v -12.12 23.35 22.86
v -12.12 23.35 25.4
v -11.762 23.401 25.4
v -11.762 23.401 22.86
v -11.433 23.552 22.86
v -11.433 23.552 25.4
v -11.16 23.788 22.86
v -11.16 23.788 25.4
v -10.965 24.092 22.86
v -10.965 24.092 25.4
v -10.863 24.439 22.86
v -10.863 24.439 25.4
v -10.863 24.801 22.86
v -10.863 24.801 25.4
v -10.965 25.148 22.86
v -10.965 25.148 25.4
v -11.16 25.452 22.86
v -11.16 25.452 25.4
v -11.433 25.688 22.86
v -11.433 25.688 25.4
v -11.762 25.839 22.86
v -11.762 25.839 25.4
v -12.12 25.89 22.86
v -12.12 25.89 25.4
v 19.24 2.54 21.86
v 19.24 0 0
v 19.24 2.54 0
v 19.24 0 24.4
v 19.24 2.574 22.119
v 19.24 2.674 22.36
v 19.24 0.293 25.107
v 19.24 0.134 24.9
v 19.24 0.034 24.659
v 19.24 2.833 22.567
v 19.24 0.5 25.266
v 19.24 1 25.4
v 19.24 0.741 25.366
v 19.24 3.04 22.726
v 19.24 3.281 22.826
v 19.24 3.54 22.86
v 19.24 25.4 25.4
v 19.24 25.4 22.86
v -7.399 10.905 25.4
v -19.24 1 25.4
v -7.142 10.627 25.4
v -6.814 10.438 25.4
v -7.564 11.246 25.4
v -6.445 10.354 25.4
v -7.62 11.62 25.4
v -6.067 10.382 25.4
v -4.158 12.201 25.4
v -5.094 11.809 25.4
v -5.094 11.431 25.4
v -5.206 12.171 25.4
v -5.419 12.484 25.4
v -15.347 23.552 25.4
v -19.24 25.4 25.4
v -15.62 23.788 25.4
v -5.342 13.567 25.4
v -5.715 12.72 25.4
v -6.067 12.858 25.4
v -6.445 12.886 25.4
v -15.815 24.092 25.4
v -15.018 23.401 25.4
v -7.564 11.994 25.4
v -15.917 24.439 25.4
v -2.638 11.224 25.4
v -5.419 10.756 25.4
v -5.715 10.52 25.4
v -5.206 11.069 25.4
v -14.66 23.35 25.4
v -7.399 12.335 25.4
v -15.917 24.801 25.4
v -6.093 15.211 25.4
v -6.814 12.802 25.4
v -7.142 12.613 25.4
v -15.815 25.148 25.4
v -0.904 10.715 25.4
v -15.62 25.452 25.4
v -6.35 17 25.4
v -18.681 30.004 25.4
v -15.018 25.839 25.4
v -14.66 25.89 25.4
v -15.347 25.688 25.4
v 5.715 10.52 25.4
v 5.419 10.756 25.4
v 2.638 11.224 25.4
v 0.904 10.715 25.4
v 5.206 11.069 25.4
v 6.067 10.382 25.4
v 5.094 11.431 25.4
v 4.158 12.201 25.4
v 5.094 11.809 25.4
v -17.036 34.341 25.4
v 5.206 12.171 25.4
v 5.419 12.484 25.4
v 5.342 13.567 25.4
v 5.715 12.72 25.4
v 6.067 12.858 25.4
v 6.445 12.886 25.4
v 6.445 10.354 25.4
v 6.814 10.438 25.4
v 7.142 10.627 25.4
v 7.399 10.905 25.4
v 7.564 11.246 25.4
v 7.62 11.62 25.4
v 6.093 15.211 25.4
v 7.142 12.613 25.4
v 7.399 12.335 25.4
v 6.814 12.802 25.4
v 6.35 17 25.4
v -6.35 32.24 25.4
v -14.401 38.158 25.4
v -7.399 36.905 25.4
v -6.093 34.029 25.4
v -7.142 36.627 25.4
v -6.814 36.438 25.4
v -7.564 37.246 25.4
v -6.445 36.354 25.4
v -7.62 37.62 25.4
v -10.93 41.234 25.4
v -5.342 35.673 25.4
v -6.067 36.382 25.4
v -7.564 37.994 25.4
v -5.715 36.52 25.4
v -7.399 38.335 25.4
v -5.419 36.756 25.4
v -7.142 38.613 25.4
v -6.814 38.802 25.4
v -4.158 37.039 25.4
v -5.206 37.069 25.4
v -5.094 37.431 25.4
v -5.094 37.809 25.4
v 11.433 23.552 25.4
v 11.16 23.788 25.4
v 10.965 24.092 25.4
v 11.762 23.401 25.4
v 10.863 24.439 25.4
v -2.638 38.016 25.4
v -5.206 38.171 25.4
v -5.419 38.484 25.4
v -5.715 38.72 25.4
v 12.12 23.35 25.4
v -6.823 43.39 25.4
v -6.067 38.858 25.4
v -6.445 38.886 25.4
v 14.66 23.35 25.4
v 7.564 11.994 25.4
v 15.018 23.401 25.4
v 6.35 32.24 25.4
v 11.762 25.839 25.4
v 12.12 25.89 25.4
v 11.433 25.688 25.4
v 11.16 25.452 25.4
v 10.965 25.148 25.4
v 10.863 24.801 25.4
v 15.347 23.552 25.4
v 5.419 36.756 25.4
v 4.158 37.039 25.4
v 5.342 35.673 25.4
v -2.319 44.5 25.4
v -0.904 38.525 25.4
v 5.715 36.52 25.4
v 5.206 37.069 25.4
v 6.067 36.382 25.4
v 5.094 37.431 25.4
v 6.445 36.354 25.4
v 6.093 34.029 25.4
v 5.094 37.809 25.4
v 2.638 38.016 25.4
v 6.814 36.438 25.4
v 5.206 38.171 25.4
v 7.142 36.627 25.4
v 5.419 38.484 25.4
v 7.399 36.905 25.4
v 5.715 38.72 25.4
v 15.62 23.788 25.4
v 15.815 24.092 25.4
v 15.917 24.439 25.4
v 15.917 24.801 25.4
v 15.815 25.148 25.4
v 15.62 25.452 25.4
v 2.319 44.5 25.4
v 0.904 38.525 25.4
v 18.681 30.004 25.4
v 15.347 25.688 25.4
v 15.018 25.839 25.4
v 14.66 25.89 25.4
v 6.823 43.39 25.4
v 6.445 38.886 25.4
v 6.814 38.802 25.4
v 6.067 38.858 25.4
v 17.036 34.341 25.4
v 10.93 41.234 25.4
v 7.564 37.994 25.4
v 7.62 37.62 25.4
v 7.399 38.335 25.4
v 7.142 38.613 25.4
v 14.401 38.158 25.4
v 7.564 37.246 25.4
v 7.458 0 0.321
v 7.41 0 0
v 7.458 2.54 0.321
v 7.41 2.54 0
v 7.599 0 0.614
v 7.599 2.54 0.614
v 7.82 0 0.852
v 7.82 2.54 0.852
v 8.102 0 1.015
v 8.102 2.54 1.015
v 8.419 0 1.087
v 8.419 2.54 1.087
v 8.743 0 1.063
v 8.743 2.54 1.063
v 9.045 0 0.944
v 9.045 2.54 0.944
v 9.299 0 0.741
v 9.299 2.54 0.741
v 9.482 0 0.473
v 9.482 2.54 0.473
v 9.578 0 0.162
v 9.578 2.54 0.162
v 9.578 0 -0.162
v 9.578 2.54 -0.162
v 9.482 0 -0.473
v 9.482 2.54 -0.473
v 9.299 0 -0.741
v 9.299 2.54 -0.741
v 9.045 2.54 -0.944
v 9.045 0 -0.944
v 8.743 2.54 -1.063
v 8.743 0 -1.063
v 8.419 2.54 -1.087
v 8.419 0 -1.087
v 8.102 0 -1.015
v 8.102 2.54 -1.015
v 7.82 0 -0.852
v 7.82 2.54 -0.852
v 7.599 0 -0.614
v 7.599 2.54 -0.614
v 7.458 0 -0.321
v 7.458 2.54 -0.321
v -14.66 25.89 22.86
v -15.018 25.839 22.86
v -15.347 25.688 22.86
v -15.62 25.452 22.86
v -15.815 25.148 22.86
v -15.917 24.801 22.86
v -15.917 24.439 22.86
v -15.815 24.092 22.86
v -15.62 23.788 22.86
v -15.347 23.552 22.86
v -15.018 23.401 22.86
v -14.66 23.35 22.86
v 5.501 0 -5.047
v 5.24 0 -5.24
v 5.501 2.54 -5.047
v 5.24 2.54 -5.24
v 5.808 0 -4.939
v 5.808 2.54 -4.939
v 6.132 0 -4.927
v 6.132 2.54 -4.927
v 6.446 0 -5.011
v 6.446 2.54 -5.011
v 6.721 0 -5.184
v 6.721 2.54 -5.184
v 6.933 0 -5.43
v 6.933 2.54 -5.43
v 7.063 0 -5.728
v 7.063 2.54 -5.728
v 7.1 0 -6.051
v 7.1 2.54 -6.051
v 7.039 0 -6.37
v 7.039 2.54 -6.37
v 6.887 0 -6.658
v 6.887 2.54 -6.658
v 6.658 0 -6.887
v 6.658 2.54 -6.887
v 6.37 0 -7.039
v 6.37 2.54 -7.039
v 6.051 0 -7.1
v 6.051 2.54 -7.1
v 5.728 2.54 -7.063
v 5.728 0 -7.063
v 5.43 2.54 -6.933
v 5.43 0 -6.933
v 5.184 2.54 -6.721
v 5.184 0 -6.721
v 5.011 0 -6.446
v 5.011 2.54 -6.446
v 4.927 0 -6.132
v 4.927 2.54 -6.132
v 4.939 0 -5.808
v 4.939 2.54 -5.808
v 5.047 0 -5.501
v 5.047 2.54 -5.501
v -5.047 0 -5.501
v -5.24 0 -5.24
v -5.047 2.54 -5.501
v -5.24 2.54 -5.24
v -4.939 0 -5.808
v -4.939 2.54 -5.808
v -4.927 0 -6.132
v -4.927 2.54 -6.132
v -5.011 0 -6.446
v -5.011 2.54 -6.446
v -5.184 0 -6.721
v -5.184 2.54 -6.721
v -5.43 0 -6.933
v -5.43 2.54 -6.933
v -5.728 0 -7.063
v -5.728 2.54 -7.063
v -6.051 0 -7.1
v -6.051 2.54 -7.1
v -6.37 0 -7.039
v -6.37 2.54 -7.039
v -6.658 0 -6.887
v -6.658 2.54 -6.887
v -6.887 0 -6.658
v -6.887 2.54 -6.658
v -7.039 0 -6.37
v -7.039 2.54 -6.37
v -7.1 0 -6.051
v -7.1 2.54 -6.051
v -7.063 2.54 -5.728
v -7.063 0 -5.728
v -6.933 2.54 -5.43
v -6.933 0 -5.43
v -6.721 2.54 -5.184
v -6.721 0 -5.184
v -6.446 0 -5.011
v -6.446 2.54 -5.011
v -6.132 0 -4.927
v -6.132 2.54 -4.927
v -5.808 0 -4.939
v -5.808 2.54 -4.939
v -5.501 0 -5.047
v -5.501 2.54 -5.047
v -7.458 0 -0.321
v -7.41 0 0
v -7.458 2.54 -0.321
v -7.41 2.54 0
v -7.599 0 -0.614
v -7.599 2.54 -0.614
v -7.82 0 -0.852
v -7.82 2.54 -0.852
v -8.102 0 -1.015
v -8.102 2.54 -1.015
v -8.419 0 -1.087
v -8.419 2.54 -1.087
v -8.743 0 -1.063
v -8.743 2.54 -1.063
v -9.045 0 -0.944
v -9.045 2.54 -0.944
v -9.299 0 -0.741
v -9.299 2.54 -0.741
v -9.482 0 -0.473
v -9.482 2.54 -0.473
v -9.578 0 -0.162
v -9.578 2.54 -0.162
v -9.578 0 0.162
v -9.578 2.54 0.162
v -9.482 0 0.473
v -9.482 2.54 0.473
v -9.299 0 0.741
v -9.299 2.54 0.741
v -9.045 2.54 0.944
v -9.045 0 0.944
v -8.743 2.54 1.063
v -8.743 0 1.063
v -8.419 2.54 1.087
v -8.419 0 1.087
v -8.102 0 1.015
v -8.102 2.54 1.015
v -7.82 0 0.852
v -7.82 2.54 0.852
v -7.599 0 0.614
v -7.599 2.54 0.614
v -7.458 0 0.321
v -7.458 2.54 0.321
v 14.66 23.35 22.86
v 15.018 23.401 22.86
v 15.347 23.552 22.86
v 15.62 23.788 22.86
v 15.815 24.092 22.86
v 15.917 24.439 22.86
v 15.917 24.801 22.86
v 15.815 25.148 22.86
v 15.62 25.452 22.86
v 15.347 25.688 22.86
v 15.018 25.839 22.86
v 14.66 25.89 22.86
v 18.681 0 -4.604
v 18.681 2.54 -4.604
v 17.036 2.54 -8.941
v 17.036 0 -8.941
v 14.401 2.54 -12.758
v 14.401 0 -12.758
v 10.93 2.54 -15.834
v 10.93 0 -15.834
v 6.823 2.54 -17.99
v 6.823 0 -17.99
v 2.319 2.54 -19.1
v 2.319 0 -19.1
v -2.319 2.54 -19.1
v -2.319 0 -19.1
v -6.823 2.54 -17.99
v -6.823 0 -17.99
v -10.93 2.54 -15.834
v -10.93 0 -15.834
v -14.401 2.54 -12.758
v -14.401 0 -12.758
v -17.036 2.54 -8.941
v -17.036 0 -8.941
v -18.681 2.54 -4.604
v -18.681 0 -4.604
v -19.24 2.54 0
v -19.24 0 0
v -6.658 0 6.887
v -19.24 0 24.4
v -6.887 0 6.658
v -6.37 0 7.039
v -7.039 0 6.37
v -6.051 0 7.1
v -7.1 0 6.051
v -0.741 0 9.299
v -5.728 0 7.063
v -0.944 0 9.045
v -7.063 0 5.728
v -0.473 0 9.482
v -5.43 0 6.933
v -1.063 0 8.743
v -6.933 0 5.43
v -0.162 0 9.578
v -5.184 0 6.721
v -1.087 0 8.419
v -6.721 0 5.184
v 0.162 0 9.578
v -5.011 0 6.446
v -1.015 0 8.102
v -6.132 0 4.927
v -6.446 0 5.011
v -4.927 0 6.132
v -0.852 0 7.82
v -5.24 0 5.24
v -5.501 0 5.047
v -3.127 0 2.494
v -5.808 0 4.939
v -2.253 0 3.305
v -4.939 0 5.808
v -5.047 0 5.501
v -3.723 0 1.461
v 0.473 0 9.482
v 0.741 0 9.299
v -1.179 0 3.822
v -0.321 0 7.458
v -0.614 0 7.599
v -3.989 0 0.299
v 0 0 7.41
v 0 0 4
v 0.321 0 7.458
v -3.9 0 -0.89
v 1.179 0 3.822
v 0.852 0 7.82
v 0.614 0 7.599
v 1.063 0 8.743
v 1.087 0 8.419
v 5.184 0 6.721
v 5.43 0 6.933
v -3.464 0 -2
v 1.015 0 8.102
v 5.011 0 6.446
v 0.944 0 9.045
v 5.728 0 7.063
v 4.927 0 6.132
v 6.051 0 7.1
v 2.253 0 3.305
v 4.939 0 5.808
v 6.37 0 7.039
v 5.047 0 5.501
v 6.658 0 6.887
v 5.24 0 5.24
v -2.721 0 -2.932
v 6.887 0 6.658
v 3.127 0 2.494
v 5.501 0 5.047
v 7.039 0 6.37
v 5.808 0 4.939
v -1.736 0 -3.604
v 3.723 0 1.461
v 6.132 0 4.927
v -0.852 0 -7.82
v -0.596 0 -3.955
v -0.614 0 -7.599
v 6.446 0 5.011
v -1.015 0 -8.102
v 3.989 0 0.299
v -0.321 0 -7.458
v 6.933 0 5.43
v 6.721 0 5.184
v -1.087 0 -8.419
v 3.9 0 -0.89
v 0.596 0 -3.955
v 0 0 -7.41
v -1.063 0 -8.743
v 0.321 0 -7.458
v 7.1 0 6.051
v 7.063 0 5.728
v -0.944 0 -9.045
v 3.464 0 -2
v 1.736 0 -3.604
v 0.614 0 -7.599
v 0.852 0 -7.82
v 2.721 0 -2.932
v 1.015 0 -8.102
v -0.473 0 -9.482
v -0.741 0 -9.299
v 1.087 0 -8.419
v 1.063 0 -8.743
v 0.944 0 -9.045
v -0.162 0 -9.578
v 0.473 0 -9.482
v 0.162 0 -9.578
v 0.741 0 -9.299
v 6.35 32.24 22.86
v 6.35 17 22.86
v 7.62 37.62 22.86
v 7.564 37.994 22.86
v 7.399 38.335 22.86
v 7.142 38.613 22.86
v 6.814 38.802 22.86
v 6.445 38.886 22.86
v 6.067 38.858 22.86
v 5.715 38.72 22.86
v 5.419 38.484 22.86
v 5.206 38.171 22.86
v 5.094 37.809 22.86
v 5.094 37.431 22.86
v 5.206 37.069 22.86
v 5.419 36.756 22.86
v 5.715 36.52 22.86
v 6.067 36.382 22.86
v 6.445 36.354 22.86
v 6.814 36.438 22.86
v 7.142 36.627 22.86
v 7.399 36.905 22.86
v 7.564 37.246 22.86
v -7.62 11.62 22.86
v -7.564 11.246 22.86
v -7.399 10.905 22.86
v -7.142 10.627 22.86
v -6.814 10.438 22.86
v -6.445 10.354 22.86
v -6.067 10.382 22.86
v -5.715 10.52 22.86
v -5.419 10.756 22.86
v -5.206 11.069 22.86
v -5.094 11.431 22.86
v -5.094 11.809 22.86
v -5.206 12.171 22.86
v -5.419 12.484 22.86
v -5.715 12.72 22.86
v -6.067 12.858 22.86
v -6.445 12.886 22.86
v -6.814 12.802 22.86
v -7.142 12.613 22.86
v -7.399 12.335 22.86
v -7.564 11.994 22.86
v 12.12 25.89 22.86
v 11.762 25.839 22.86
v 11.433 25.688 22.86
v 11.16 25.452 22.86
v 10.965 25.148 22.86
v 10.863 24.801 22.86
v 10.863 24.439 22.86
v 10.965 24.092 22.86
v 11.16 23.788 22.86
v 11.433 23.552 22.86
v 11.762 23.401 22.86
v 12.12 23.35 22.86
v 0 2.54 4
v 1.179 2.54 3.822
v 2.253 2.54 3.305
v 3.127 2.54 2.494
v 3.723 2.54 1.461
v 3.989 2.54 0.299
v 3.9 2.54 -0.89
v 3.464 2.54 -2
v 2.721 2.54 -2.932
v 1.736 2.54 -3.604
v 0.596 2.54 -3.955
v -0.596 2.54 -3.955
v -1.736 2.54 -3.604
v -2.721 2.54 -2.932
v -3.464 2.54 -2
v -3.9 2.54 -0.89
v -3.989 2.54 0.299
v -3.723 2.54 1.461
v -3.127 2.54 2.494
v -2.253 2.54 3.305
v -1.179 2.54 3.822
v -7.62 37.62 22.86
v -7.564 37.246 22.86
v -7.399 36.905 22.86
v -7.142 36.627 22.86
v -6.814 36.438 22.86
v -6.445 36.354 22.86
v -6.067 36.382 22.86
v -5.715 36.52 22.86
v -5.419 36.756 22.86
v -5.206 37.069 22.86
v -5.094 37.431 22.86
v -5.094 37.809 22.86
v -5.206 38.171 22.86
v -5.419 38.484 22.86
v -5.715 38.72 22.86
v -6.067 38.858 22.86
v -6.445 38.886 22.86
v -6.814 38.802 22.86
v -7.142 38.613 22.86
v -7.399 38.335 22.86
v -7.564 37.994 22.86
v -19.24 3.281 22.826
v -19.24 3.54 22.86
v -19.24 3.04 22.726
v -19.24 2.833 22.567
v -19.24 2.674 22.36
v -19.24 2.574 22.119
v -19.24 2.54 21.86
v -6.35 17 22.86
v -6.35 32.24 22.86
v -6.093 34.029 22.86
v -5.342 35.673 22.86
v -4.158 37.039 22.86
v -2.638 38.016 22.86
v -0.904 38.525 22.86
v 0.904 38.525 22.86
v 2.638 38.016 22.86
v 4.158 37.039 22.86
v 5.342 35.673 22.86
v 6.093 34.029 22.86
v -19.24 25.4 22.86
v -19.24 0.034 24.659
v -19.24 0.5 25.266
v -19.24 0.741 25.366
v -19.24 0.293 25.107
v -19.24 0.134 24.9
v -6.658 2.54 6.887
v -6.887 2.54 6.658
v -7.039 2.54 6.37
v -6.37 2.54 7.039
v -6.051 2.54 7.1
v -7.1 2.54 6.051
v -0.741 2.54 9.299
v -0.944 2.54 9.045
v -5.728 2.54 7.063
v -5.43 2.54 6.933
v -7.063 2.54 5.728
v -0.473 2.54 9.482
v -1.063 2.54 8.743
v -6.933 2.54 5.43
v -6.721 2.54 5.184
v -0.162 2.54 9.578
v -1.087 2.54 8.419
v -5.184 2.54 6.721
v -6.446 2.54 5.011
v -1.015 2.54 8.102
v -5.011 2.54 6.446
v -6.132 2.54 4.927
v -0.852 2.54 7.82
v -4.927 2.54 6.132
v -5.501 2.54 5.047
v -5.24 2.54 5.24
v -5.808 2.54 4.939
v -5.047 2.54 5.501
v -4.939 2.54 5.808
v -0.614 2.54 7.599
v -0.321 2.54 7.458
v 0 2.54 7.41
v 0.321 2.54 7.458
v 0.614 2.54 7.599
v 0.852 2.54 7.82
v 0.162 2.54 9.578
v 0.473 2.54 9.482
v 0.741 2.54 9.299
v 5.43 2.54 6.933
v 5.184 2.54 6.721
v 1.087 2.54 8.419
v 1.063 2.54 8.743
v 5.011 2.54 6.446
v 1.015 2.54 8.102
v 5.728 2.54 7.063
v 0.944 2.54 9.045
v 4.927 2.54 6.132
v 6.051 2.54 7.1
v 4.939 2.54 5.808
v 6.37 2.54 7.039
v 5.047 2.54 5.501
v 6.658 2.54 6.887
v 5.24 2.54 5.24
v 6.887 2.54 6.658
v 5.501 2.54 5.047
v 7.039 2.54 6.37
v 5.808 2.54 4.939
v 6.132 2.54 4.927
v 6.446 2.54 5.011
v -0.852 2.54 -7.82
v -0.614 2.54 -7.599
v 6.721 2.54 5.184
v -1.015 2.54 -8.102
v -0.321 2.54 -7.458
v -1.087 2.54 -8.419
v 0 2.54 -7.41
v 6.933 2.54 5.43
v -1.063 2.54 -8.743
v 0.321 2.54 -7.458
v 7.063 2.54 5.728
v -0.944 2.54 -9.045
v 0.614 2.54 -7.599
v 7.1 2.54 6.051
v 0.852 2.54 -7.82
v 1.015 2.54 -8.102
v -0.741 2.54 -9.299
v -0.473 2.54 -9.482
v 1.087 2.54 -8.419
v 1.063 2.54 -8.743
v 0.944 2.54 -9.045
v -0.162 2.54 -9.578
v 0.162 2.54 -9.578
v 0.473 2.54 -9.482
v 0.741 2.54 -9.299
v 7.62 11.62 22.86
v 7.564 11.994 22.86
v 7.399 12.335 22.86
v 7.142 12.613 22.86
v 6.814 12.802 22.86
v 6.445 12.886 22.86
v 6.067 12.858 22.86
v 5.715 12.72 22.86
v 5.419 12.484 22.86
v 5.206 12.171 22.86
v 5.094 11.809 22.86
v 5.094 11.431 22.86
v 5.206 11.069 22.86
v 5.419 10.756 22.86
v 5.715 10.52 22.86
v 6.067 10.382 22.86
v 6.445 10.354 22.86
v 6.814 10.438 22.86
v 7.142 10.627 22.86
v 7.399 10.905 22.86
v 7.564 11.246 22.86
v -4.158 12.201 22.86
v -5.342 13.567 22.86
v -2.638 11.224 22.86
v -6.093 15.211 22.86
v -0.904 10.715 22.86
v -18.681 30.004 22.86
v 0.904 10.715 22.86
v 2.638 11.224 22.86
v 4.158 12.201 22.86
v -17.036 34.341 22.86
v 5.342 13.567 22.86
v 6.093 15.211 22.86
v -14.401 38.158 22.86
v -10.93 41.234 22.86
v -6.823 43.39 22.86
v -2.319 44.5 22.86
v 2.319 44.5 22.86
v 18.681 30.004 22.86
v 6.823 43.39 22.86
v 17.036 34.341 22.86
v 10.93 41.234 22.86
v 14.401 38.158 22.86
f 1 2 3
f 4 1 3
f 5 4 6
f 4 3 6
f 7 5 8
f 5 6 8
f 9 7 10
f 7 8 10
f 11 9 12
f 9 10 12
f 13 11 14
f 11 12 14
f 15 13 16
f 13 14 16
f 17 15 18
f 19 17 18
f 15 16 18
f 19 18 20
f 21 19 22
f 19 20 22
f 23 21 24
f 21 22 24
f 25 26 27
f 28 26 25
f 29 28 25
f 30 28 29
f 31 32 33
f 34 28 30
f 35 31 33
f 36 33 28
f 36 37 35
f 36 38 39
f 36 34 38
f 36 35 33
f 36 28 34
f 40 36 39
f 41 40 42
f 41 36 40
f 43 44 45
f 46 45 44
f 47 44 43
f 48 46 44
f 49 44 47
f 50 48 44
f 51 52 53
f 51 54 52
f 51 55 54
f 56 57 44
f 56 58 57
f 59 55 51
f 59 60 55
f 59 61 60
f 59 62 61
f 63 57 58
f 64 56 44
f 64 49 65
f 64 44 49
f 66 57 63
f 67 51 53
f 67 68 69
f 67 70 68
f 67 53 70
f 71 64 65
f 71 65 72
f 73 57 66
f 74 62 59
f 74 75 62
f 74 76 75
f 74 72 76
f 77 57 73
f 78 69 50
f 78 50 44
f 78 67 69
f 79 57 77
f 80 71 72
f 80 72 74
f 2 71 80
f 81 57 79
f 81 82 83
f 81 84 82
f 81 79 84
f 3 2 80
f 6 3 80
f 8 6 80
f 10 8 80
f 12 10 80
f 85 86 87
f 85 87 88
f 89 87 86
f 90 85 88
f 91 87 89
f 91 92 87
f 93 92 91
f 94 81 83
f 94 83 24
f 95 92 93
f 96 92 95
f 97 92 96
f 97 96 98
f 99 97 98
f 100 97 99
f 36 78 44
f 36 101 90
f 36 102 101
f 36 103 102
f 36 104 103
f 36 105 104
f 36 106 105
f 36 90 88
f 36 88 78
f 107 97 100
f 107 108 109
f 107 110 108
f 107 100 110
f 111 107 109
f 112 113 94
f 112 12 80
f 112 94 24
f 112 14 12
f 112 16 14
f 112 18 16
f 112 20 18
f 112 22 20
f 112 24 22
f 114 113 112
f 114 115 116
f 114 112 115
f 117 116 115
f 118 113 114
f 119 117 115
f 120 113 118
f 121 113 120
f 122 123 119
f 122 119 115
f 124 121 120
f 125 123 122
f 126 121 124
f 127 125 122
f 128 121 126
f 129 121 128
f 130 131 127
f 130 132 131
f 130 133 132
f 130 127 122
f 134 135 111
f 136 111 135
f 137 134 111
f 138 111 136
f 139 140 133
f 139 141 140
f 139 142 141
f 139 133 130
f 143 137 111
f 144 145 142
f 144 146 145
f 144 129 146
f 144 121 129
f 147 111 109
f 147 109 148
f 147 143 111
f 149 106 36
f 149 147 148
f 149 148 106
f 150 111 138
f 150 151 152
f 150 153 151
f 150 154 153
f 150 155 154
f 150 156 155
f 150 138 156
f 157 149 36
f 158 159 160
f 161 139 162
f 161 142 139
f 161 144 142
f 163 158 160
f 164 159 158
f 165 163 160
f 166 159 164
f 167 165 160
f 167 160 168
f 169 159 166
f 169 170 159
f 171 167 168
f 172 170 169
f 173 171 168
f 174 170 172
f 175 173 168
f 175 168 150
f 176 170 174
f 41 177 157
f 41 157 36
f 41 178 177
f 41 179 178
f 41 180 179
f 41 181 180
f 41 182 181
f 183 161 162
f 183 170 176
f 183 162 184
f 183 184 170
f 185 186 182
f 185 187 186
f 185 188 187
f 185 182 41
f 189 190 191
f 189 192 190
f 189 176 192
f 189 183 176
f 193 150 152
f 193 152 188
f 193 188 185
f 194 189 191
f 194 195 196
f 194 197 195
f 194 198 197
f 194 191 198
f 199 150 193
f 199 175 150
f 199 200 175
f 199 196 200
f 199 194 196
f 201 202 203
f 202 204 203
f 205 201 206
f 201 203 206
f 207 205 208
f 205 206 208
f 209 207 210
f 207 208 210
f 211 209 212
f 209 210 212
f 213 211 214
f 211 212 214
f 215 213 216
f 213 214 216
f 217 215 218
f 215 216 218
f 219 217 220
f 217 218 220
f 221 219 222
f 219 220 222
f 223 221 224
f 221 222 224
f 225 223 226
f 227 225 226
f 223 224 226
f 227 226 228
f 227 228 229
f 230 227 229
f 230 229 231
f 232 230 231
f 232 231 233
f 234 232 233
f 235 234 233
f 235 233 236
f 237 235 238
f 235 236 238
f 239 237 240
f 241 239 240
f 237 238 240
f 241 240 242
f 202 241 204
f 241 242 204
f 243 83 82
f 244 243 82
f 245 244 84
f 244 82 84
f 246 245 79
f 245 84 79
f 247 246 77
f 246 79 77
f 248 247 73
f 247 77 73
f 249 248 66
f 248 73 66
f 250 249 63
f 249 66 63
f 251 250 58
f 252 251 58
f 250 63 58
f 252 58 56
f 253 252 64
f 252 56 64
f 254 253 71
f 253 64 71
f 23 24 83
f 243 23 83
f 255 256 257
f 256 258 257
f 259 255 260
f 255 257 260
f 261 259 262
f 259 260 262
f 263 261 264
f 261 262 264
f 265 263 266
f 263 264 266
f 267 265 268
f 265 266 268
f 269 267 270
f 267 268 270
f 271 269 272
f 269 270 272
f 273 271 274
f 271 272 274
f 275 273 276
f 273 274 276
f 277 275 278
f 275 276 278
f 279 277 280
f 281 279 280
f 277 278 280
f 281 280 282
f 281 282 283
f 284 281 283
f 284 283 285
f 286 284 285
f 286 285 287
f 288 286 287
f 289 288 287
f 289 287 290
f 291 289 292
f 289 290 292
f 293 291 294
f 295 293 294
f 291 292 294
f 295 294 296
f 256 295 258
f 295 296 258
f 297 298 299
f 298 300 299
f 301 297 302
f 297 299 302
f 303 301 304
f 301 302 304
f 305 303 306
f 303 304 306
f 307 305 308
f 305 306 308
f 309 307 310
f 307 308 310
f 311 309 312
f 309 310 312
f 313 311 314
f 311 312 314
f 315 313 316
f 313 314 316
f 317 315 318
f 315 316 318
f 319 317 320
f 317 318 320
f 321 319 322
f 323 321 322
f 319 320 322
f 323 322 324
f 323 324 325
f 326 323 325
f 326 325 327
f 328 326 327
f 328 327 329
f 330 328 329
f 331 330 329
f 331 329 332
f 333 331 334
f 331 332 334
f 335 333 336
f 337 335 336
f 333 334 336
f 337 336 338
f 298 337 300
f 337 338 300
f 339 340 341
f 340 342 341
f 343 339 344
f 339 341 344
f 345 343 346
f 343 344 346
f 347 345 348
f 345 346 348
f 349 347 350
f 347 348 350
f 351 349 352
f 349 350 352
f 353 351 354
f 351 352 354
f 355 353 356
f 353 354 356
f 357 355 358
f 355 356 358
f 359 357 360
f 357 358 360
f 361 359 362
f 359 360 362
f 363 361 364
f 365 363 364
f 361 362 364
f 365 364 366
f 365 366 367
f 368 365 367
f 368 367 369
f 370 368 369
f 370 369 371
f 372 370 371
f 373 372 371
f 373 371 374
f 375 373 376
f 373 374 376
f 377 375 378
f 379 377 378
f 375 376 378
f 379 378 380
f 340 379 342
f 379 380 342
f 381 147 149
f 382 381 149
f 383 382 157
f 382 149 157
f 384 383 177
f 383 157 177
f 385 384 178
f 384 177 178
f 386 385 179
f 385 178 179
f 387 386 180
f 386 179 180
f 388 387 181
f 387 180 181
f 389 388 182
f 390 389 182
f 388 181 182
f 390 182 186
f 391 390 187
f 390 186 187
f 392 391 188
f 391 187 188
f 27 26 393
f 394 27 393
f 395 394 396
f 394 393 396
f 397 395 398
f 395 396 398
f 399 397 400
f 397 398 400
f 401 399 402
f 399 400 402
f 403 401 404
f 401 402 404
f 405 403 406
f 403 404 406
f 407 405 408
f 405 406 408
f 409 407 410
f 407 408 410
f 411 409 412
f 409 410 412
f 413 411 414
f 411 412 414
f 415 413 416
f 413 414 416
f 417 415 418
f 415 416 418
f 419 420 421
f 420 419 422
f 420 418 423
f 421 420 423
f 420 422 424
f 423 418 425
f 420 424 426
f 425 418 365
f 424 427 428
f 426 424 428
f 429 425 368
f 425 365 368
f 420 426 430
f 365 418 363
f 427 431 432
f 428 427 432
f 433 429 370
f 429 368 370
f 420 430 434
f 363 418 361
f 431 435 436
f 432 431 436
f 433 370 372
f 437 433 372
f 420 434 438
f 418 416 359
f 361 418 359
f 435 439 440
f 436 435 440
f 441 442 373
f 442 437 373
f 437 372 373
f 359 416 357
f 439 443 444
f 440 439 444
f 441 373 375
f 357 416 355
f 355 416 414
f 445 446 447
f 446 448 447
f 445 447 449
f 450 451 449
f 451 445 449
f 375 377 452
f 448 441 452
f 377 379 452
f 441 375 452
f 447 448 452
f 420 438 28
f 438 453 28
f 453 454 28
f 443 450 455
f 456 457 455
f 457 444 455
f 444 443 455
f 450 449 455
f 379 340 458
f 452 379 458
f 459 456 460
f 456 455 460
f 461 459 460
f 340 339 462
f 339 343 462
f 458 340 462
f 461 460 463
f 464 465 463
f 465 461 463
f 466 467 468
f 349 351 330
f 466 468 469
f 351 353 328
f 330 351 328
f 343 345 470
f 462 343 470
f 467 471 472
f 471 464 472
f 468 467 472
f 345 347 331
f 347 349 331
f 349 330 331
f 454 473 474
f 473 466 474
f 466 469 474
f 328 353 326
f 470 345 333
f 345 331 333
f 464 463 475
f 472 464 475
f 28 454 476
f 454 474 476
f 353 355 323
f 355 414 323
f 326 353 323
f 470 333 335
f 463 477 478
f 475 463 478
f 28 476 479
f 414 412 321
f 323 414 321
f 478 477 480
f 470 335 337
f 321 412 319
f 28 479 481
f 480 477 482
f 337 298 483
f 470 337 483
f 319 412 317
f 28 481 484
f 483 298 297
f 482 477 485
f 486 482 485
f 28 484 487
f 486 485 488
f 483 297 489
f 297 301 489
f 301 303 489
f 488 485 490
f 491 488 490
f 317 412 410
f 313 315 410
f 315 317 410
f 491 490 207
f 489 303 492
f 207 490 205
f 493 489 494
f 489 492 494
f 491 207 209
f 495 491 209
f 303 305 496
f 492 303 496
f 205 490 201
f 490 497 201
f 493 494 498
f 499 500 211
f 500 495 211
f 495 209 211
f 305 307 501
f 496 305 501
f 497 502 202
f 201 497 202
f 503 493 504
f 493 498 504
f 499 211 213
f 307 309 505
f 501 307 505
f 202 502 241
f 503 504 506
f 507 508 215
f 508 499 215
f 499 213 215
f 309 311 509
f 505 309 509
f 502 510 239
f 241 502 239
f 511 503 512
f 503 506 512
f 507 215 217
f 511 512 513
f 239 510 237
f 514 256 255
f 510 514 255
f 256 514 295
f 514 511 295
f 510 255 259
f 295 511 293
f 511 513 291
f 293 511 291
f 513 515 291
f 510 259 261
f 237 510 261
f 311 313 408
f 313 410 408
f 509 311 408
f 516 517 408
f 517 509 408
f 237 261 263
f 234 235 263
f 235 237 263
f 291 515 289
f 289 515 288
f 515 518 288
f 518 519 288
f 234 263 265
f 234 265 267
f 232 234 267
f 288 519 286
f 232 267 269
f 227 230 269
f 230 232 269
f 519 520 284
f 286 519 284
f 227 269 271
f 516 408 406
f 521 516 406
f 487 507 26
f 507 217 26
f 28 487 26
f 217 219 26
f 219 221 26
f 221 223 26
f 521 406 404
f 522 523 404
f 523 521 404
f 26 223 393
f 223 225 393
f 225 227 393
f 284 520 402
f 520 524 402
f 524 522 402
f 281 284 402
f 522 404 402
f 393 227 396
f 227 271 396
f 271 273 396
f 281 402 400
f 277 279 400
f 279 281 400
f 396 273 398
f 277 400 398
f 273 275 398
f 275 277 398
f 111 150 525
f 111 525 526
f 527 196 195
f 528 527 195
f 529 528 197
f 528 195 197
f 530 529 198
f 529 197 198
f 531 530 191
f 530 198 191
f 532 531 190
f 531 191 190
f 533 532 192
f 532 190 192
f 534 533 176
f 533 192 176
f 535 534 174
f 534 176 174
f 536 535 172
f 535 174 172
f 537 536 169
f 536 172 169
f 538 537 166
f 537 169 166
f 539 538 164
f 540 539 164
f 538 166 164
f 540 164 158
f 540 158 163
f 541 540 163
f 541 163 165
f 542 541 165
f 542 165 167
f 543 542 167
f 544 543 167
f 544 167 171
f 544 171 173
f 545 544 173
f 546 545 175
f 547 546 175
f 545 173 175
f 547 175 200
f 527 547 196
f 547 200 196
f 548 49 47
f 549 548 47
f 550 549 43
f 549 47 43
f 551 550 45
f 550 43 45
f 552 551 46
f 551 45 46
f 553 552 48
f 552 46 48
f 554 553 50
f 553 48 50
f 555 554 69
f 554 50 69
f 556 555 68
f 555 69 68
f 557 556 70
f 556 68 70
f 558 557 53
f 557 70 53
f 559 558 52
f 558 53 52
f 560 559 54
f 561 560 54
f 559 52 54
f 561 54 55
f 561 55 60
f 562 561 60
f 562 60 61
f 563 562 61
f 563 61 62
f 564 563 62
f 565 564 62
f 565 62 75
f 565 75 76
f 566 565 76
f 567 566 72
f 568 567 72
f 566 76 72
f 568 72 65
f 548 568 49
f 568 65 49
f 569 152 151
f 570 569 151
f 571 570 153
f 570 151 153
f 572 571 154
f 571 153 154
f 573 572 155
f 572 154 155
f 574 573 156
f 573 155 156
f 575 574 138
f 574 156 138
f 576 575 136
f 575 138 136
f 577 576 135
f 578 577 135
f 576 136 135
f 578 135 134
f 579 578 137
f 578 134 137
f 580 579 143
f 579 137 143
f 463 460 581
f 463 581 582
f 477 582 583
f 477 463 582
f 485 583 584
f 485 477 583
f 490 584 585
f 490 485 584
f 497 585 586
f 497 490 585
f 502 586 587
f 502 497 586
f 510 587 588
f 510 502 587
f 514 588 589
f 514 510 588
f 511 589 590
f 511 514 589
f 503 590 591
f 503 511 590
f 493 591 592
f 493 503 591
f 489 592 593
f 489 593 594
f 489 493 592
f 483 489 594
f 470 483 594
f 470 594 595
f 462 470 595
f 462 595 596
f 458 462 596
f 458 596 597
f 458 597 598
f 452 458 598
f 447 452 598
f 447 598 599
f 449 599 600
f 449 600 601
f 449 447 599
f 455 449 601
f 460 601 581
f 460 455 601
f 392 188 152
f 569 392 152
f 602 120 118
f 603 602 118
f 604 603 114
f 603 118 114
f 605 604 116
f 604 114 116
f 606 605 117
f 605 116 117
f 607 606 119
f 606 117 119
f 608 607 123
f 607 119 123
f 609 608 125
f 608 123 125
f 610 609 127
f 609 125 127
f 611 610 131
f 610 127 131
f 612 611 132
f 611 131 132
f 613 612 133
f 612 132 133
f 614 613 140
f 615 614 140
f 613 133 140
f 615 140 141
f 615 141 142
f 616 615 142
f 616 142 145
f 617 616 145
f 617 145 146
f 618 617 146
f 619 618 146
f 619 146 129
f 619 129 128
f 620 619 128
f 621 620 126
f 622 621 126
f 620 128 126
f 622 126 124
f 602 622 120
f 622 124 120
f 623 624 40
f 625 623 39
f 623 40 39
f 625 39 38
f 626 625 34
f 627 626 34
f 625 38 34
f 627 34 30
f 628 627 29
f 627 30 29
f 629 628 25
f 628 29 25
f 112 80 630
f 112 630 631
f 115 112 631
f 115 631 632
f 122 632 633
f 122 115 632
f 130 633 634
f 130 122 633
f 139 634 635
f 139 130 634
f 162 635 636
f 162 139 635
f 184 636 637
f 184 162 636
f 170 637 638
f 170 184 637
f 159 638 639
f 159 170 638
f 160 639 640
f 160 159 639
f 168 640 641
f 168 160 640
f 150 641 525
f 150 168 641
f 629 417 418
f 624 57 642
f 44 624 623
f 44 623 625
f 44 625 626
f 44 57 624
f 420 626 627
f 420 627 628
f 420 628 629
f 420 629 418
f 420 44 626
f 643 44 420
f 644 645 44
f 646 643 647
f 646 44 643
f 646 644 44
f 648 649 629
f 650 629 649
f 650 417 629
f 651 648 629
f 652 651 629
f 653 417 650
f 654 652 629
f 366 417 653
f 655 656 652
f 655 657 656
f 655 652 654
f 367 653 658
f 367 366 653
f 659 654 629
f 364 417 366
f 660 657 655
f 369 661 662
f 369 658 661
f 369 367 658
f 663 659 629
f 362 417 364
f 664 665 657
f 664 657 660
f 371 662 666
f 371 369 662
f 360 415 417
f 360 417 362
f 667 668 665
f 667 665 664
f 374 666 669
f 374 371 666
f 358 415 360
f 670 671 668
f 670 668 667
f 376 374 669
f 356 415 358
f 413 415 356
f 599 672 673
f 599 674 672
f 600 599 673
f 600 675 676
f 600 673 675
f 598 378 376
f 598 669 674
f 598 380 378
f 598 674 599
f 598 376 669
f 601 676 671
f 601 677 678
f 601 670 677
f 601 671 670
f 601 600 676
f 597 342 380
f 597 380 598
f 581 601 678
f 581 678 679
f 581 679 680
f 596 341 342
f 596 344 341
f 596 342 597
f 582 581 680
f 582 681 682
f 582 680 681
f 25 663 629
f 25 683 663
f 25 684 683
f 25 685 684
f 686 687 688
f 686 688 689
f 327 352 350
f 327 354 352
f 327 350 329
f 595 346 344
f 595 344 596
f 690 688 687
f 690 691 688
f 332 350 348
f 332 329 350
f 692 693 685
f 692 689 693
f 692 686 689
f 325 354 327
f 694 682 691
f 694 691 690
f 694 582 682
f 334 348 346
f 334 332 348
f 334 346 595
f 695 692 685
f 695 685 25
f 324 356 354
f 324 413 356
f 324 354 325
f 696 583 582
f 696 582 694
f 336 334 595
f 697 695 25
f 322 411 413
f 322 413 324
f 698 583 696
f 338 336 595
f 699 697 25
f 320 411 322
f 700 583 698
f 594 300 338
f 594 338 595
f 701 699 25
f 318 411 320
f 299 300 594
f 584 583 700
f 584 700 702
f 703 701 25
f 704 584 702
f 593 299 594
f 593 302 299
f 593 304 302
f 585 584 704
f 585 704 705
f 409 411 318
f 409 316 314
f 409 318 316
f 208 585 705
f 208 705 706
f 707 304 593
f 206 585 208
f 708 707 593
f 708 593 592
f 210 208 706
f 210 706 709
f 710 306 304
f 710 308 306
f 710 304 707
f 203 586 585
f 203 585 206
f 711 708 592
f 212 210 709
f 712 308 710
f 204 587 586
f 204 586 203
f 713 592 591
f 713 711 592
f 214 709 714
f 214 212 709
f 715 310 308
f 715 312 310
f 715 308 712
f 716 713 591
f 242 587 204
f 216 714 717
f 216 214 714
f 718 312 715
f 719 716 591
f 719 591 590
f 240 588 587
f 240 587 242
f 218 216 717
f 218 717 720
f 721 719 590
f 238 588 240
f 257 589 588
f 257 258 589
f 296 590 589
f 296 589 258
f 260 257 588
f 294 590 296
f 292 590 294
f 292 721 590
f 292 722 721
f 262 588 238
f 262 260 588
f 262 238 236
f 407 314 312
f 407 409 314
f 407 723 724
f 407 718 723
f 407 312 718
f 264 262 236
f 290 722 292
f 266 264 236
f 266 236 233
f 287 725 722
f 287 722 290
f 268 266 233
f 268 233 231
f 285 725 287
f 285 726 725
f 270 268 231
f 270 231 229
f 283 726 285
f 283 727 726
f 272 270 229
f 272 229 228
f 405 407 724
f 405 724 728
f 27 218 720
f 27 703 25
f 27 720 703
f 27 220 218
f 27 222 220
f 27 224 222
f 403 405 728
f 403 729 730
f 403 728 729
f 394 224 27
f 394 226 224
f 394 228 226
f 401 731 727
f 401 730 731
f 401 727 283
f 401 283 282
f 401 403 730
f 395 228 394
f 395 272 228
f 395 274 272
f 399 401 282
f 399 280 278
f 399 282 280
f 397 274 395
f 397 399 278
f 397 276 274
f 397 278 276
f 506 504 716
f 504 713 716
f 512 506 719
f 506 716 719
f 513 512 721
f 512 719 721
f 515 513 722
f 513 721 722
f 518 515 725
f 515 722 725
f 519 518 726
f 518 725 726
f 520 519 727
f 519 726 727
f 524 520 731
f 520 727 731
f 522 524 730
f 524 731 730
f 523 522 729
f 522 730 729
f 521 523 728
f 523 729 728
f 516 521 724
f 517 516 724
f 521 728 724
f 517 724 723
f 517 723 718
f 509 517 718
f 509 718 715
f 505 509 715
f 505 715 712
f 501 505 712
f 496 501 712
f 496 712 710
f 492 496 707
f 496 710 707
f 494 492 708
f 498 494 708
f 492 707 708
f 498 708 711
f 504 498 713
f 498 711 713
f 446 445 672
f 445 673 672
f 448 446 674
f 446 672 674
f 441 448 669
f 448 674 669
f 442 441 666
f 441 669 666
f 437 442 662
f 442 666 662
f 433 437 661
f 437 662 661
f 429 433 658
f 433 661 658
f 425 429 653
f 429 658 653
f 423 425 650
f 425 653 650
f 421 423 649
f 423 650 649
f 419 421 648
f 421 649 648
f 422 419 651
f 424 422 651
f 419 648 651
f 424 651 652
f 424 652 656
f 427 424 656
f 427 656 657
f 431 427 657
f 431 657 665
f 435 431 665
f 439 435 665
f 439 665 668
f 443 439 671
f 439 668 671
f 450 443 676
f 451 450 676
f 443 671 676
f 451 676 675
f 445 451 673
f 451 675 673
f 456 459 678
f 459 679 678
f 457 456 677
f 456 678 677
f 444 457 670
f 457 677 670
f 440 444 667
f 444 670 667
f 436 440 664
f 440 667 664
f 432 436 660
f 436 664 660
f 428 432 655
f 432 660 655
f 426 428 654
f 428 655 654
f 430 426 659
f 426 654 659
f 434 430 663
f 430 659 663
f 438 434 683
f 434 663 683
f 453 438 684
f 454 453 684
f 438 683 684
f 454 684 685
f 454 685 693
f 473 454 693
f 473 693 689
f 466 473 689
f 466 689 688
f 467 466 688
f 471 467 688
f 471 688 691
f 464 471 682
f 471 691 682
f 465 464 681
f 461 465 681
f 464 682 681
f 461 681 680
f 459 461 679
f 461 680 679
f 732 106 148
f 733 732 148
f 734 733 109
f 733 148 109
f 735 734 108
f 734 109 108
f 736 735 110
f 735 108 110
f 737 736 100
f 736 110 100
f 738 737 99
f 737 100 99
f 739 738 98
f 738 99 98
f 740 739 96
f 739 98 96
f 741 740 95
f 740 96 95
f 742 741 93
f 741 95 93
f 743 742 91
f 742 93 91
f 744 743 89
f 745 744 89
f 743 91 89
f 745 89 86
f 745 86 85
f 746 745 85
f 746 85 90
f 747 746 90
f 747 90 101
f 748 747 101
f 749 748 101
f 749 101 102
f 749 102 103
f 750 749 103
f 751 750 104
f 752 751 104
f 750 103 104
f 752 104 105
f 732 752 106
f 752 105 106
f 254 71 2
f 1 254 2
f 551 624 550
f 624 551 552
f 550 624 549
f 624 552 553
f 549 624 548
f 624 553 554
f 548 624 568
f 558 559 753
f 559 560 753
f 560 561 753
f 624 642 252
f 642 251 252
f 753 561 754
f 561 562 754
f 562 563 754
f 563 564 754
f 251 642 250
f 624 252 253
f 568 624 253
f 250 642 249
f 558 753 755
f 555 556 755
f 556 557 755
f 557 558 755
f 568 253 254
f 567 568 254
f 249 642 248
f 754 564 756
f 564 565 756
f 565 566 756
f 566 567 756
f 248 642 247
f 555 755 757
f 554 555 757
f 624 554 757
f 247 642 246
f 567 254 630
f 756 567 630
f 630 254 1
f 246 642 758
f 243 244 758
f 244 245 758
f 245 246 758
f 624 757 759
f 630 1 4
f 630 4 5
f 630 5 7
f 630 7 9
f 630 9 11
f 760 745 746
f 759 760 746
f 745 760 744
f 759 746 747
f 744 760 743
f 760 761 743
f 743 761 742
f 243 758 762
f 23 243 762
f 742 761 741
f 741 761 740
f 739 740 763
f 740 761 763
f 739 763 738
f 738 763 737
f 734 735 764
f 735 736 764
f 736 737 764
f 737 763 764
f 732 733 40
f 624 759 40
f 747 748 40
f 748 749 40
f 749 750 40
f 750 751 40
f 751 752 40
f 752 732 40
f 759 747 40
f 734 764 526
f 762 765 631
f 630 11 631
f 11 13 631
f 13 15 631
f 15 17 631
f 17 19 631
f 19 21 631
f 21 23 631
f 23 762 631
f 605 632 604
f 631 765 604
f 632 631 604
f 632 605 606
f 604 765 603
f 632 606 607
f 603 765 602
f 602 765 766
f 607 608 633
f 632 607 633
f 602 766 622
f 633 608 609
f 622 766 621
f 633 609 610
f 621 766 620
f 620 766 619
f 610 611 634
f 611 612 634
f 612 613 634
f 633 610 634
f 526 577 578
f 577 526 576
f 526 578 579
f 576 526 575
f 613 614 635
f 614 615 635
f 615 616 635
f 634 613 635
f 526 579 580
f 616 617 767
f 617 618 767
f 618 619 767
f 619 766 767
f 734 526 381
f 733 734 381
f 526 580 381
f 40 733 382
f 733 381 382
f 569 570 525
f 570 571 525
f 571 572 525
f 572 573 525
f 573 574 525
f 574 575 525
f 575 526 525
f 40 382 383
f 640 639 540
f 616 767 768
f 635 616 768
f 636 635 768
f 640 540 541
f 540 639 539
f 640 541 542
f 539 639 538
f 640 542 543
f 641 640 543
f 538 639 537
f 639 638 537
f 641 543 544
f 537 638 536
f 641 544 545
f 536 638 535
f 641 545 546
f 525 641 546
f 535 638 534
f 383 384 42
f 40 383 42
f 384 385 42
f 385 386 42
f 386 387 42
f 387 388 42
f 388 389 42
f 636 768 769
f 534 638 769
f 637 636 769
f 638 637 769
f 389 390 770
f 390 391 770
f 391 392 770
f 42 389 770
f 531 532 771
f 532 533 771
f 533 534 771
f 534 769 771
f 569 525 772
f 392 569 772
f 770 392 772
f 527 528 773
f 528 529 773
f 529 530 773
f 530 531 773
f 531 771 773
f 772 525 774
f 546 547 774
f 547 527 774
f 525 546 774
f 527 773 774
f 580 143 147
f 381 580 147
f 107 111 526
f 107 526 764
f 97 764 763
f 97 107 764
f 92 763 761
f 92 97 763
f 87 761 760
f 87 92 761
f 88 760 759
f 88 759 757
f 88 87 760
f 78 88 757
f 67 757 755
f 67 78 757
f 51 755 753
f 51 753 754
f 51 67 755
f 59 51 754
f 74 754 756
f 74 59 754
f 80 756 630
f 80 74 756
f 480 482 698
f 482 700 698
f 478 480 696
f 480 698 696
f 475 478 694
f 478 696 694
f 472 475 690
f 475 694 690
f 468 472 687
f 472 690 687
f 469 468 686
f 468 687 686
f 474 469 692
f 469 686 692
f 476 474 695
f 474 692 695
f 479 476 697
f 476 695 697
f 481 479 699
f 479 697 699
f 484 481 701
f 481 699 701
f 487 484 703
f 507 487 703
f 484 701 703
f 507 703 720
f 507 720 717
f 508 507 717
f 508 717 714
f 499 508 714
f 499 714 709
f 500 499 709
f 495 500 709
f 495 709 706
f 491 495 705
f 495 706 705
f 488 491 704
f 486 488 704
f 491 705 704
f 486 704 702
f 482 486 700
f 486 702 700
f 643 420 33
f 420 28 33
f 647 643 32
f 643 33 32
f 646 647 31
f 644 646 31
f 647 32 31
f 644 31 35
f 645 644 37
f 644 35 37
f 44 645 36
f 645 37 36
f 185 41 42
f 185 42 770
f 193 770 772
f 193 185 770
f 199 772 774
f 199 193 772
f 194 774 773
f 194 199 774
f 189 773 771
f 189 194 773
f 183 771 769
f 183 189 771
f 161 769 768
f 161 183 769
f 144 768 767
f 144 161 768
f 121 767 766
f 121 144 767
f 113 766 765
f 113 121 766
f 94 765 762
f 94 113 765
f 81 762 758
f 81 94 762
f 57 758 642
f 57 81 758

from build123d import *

# Parameters (mm, degrees)
SKETCH1_R           = 4
BOSS_EXTRUDE1_DEPTH = 2.54
SKETCH2_R           = 1.09
CUT_EXTRUDE1_DEPTH  = 5
CIRPATTERN1_COUNT   = 8
SKETCH3_R           = 1.27
BOSS_EXTRUDE2_DEPTH = 2.54
FILLET1_R           = 1


with BuildPart() as part:
    # Sketch1 → Boss-Extrude1 (new body)
    with BuildSketch(Plane(origin=(0, 0, 0), x_dir=(1, 0, 0), z_dir=(0, 1, 0))):
        with BuildLine():
            Line((-19.24, 0), (-19.24, -25.4))
            Line((-19.24, -25.4), (19.24, -25.4))
            Line((19.24, -25.4), (19.24, 0))
            ThreePointArc((19.24, 0), (0, 19.24), (-19.24, 0))
        make_face()
        with Locations(Location((0, 0, 0), (0, 0, 270))):
            Circle(SKETCH1_R, mode=Mode.SUBTRACT)
    extrude(amount=BOSS_EXTRUDE1_DEPTH)

    # Sketch2 → Cut-Extrude1 (cut, symmetric)
    with BuildSketch(Plane(origin=(0, 2.54, 0), x_dir=(1, 0, 0), z_dir=(0, 1, 0))):
        with Locations(Location((0, 8.5, 0), (0, 0, 270))):
            Circle(SKETCH2_R)
    cut_extrude1 = extrude(amount=CUT_EXTRUDE1_DEPTH, both=True, mode=Mode.SUBTRACT)

    # CirPattern1: Cut-Extrude1 ×8 about axis
    cirpattern1_axis = Axis((0, 0, 0), (0, 1, 0))
    for i in range(1, CIRPATTERN1_COUNT):
        add(cut_extrude1.rotate(cirpattern1_axis, i * 360 / CIRPATTERN1_COUNT), mode=Mode.SUBTRACT)

    # Sketch3 → Boss-Extrude2 (add)
    with BuildSketch(Plane.XY.offset(25.4)):
        with BuildLine():
            Line((19.24, 2.54), (19.24, 25.4))
            ThreePointArc((19.24, 25.4), (0, 44.64), (-19.24, 25.4))
            Line((-19.24, 25.4), (-19.24, 2.54))
            Line((-19.24, 2.54), (19.24, 2.54))
        make_face()
        with Locations((6.35, 37.62)):
            Circle(SKETCH3_R, mode=Mode.SUBTRACT)
        with Locations((6.35, 11.62)):
            Circle(SKETCH3_R, mode=Mode.SUBTRACT)
        with Locations(Location((-6.35, 11.62, 0), (0, 0, 180))):
            Circle(SKETCH3_R, mode=Mode.SUBTRACT)
        with Locations(Location((-6.35, 37.62, 0), (0, 0, 180))):
            Circle(SKETCH3_R, mode=Mode.SUBTRACT)
        with BuildLine():
            Line((6.35, 32.24), (6.35, 17))
            ThreePointArc((6.35, 17), (0, 10.65), (-6.35, 17))
            Line((-6.35, 17), (-6.35, 32.24))
            ThreePointArc((-6.35, 32.24), (0, 38.59), (6.35, 32.24))
        make_face(mode=Mode.SUBTRACT)
        with BuildLine():
            Line((14.66, 25.89), (12.12, 25.89))
            ThreePointArc((12.12, 25.89), (10.85, 24.62), (12.12, 23.35))
            Line((12.12, 23.35), (14.66, 23.35))
            ThreePointArc((14.66, 23.35), (15.93, 24.62), (14.66, 25.89))
        make_face(mode=Mode.SUBTRACT)
        with BuildLine():
            Line((-14.66, 23.35), (-12.12, 23.35))
            ThreePointArc((-12.12, 23.35), (-10.85, 24.62), (-12.12, 25.89))
            Line((-12.12, 25.89), (-14.66, 25.89))
            ThreePointArc((-14.66, 25.89), (-15.93, 24.62), (-14.66, 23.35))
        make_face(mode=Mode.SUBTRACT)
    extrude(amount=-BOSS_EXTRUDE2_DEPTH)

    # Fillet1
    fillet1_edges = [part.edges().sort_by_distance(p)[0] for p in [
        (0, 0, 25.4),
        (0, 2.54, 22.86),
    ]]
    fillet(fillet1_edges, radius=FILLET1_R)


solid = part.part
